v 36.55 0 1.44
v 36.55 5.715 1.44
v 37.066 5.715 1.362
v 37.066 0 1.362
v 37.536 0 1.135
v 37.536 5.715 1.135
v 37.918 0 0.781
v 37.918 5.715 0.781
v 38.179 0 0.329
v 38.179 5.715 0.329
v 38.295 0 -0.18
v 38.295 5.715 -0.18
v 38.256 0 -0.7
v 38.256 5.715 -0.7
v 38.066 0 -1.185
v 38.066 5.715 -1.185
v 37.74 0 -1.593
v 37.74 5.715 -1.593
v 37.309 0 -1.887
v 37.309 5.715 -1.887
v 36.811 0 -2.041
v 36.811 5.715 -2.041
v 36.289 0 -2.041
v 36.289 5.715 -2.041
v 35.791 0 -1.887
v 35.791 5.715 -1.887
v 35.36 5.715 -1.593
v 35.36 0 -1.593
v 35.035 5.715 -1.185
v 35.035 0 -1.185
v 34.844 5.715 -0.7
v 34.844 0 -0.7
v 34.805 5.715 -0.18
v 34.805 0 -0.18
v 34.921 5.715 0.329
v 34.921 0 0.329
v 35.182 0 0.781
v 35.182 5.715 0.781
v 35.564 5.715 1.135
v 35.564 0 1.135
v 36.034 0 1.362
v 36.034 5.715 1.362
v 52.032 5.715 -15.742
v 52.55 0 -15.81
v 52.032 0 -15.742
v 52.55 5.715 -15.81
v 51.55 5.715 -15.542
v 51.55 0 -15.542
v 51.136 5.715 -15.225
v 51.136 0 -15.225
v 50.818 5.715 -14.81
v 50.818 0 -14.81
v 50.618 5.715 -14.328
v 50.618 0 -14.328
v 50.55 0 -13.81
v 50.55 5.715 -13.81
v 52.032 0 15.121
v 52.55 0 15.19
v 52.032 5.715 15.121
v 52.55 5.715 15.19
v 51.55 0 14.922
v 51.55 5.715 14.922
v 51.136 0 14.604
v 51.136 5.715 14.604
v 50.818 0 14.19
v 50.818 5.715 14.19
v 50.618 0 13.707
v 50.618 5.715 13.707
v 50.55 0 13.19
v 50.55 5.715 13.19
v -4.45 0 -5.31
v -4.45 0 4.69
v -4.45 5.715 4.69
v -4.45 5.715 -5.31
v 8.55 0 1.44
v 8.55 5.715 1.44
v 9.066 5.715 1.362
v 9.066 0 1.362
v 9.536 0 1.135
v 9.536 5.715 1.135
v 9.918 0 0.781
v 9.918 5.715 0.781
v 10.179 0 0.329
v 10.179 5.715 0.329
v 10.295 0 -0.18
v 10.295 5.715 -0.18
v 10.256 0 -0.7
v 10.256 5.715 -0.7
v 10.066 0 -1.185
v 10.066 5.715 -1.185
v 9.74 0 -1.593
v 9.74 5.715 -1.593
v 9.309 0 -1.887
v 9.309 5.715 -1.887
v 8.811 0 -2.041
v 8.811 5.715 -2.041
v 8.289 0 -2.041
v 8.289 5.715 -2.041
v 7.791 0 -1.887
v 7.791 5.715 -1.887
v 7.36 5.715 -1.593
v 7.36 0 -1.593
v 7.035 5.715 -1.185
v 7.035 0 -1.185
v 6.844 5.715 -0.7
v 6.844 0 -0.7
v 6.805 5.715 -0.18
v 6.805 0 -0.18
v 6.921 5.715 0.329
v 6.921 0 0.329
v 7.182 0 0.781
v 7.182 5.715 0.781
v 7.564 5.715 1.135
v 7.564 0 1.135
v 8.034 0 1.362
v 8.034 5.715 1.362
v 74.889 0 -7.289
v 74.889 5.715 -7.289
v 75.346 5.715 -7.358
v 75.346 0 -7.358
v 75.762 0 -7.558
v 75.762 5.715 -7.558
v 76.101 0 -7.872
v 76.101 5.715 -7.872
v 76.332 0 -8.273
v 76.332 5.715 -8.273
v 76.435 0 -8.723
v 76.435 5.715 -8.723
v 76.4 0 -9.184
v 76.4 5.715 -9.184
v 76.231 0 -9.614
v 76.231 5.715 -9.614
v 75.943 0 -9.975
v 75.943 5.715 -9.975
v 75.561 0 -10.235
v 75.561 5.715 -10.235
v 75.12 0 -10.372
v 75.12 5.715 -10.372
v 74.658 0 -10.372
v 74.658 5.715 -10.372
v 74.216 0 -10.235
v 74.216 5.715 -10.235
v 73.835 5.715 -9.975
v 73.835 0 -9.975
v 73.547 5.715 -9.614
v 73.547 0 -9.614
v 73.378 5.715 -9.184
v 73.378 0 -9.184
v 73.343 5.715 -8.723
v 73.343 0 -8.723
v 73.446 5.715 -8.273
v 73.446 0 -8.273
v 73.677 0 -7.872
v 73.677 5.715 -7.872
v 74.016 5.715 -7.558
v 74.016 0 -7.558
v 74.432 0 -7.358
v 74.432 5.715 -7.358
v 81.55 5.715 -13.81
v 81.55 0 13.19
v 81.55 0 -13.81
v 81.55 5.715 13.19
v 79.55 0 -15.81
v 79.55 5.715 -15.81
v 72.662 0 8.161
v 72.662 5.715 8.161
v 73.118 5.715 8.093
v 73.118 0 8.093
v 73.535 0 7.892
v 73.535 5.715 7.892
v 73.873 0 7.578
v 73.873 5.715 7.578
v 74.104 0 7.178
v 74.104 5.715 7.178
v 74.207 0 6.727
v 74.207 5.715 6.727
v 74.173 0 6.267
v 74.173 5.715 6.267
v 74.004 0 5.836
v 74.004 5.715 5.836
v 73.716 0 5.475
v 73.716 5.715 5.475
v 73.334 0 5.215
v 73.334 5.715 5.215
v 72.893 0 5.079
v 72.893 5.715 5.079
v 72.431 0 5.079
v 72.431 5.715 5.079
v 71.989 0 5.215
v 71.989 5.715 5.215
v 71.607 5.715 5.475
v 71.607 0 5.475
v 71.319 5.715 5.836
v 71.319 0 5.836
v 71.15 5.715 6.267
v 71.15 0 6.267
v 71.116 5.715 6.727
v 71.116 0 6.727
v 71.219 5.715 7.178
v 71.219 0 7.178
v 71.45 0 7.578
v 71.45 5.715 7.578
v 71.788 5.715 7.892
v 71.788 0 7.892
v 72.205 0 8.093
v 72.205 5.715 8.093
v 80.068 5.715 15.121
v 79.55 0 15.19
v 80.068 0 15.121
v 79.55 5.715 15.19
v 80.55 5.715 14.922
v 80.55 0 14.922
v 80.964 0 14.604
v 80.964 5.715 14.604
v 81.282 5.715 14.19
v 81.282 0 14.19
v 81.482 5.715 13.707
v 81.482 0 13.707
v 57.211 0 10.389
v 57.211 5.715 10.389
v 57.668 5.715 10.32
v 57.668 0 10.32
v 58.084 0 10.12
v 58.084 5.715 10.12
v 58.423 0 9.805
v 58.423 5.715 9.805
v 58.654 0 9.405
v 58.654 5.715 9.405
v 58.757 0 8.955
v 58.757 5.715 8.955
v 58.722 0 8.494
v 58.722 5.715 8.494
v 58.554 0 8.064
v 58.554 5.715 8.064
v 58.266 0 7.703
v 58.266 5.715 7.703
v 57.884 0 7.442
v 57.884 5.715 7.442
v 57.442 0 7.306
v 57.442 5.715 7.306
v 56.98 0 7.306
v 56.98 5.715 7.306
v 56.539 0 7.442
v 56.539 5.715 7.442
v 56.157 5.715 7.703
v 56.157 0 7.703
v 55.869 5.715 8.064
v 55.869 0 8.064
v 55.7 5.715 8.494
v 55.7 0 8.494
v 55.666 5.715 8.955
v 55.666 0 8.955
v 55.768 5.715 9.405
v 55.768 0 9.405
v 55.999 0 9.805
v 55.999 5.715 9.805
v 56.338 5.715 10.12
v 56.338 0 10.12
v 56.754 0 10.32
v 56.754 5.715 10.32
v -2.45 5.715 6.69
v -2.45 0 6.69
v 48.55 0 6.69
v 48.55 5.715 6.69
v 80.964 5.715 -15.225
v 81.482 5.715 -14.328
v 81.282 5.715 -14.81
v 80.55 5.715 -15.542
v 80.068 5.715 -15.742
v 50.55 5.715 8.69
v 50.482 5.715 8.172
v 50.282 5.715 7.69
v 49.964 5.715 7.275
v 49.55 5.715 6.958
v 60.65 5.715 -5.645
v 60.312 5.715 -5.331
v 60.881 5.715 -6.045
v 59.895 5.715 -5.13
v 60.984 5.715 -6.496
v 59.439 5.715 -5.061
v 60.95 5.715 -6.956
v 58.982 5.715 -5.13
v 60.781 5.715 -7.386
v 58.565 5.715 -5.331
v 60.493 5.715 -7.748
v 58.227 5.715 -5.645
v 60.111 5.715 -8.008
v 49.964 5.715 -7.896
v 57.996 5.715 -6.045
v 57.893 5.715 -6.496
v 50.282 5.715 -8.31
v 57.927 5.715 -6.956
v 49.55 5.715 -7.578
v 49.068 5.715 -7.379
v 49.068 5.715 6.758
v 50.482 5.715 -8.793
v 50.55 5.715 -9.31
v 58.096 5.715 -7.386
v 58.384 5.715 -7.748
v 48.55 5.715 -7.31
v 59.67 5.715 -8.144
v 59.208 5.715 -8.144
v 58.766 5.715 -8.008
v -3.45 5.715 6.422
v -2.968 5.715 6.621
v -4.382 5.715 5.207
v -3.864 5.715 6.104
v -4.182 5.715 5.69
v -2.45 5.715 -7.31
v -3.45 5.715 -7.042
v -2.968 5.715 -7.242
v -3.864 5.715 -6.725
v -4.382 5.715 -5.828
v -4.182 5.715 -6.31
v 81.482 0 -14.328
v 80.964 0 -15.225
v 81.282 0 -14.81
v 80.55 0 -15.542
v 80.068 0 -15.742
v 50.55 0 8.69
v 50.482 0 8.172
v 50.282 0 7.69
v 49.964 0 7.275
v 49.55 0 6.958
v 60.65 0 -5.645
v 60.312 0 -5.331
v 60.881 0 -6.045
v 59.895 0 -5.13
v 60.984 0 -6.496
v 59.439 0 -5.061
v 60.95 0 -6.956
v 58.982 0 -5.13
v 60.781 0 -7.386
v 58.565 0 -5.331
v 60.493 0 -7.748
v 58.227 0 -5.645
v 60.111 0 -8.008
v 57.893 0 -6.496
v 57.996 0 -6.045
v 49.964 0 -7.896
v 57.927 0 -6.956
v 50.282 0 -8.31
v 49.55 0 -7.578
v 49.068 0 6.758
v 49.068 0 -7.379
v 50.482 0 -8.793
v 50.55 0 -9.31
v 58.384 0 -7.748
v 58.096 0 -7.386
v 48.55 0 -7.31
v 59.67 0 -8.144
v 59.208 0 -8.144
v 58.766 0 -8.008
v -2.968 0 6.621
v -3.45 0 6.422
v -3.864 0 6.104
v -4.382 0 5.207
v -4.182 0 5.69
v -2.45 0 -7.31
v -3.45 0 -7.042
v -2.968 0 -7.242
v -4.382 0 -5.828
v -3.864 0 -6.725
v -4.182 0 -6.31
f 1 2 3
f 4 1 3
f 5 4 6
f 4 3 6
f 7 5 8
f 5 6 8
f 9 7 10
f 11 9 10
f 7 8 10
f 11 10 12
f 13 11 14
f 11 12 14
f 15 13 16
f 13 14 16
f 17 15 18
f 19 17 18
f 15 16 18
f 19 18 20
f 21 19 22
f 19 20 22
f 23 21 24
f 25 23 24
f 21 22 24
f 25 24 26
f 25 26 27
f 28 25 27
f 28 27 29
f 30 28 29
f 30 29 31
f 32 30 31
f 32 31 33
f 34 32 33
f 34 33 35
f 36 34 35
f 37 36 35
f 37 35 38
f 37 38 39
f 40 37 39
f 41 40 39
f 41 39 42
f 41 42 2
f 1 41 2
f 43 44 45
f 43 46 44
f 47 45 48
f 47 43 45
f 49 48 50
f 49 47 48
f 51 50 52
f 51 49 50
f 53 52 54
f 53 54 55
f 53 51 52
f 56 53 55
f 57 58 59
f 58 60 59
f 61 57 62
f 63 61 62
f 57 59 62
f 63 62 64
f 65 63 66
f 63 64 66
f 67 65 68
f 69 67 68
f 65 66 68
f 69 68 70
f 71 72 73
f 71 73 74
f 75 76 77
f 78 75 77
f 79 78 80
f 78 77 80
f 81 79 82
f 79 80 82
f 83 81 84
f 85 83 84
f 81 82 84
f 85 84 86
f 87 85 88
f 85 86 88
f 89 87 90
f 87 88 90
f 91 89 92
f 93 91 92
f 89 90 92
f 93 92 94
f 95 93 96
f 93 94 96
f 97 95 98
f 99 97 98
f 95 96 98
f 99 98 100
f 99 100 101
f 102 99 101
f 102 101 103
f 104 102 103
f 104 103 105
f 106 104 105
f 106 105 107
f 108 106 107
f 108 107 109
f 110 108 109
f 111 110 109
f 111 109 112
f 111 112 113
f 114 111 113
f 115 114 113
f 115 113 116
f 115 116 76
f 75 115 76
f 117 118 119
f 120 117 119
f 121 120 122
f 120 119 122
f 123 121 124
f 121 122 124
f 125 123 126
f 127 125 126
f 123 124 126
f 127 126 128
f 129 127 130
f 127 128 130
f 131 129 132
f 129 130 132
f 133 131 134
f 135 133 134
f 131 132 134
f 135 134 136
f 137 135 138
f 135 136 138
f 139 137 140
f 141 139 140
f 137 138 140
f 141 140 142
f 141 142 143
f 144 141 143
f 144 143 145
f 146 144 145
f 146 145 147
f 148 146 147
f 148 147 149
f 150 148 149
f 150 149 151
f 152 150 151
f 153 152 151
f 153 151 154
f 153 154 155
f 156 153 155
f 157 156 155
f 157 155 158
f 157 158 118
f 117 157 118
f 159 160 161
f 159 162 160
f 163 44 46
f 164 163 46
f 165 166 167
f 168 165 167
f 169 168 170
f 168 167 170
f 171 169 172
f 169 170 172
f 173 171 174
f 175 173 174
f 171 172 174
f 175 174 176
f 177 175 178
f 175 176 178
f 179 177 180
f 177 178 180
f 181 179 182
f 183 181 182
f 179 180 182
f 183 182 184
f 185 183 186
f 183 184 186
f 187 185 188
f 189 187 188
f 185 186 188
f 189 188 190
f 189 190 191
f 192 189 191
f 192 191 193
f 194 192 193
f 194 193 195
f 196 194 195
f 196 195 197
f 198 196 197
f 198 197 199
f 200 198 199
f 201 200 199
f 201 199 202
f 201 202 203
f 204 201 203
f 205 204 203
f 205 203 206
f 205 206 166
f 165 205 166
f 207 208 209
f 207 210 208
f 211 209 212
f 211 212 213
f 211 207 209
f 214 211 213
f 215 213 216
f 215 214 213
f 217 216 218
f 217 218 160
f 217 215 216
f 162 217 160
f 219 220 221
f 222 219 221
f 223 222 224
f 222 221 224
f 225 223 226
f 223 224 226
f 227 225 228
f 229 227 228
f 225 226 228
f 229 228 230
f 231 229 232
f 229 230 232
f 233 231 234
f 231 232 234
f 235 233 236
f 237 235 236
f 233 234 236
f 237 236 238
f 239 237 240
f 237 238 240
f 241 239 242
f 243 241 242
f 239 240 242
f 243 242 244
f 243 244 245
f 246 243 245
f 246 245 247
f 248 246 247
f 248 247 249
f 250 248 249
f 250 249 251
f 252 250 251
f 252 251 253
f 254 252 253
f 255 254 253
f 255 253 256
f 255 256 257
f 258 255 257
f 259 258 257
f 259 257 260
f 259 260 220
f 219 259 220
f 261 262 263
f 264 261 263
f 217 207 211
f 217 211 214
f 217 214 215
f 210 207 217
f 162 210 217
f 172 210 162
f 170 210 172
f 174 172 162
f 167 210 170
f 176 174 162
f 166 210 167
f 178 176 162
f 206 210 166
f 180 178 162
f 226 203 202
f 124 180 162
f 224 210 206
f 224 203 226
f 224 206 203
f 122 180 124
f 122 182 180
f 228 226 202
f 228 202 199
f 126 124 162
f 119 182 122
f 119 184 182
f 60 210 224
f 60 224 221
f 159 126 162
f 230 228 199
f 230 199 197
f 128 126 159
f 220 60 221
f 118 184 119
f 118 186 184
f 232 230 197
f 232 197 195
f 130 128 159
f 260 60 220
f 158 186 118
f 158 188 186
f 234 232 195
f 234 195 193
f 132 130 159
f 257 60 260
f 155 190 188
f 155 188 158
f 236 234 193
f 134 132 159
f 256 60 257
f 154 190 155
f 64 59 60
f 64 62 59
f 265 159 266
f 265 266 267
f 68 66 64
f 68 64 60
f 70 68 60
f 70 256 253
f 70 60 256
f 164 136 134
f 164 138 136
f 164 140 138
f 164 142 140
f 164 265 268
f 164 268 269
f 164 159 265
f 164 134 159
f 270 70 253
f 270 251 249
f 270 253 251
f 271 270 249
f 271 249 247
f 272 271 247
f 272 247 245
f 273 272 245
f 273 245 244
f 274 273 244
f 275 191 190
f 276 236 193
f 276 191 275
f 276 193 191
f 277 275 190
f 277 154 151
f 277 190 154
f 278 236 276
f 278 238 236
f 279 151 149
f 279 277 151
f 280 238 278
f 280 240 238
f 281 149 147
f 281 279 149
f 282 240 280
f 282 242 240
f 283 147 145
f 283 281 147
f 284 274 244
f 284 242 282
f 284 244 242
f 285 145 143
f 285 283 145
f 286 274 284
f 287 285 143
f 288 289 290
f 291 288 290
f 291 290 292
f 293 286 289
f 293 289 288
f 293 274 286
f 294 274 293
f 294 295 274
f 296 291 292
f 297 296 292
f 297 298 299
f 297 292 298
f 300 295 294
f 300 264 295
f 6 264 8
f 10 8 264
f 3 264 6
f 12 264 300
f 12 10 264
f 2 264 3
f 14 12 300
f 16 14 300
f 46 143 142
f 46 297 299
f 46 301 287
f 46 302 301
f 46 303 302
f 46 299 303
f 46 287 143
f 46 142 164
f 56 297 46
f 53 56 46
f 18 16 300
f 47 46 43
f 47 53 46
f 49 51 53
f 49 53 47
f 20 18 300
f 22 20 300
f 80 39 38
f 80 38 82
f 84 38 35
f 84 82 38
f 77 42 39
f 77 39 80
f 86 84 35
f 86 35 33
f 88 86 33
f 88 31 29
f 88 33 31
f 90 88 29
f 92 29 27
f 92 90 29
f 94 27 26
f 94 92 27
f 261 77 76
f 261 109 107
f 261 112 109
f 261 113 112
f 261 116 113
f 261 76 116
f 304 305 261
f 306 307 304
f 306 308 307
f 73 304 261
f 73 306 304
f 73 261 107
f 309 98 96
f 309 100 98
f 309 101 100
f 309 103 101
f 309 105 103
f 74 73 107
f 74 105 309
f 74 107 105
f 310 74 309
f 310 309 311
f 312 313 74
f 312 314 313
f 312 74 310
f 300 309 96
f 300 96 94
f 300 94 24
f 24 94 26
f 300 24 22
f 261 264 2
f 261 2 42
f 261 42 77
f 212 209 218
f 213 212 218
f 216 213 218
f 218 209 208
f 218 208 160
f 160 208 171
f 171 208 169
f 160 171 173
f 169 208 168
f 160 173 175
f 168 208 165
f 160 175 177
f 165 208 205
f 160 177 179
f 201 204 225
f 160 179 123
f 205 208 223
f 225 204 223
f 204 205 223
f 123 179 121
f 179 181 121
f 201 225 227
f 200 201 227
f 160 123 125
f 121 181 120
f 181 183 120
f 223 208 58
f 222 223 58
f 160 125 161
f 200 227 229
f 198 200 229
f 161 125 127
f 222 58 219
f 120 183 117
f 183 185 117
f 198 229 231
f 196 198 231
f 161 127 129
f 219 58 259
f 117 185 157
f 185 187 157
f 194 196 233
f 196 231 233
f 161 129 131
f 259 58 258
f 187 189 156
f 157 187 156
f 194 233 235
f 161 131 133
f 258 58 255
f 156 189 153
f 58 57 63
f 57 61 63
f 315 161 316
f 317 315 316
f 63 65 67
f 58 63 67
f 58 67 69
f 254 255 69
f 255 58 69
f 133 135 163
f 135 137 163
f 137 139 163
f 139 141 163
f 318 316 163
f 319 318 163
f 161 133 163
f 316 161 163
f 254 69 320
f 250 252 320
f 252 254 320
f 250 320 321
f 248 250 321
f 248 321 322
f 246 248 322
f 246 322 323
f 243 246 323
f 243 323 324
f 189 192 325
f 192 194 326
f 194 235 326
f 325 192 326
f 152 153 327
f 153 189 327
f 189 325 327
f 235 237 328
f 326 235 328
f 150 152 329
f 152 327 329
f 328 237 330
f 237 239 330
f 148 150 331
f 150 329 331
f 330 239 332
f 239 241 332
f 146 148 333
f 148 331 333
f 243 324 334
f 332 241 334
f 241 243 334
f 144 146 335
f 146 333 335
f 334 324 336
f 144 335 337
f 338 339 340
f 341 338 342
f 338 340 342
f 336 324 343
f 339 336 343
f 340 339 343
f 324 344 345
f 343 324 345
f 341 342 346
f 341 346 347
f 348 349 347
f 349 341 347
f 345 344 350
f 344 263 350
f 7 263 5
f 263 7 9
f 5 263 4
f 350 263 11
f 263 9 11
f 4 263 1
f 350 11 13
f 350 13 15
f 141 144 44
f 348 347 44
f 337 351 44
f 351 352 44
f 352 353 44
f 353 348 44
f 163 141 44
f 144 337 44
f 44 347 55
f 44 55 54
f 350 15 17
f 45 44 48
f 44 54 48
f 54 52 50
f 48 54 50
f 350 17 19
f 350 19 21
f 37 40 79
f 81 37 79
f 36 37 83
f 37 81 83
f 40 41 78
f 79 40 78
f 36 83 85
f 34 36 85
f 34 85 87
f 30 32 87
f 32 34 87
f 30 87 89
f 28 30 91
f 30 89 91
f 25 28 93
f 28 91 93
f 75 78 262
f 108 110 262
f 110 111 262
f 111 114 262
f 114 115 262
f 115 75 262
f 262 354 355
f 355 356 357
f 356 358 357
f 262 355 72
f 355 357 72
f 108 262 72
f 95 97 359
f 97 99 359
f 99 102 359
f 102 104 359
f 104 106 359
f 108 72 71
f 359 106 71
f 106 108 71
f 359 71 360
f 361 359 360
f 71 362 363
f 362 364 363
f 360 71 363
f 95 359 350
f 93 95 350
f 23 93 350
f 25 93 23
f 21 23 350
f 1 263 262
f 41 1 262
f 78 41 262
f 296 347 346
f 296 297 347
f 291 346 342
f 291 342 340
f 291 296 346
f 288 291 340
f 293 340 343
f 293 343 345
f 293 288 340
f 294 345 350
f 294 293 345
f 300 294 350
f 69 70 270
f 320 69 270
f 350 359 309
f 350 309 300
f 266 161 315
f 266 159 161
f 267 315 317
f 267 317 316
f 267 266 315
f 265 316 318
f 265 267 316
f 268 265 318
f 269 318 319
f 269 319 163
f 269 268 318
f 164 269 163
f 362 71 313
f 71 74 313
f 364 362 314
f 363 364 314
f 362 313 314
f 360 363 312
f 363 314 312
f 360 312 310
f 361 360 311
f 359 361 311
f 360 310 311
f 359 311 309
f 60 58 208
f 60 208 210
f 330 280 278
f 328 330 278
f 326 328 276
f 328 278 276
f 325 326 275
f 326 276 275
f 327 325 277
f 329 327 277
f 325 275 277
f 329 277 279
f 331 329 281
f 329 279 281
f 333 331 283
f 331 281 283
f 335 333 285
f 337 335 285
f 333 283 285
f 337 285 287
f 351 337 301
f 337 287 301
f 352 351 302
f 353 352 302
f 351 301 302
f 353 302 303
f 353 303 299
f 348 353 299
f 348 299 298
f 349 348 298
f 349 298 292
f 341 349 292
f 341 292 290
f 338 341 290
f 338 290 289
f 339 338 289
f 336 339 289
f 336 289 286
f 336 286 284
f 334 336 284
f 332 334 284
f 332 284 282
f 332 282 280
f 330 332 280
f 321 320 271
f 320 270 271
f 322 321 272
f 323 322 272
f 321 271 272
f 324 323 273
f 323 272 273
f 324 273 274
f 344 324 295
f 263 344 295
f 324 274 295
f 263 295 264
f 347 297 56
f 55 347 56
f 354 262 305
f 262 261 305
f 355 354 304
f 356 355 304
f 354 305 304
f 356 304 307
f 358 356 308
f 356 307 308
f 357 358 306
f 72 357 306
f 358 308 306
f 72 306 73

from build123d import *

# Parameters (mm, degrees)
SKETCH1_W           = 55
SKETCH1_H           = 14
BOSS_EXTRUDE1_DEPTH = 5.715
SKETCH2_R           = 1.75
CUT_EXTRUDE1_DEPTH  = 52.394687241
SKETCH3_W           = 31
SKETCH3_H           = 5.715
BOSS_EXTRUDE2_DEPTH = 31
SKETCH4_R           = 1.55
CUT_EXTRUDE2_DEPTH  = 84.264914302
FILLET1_R           = 2


with BuildPart() as part:
    # Sketch1 → Boss-Extrude1 (new body)
    with BuildSketch(Plane(origin=(0, 0, 0), x_dir=(1, 0, 0), z_dir=(0, 1, 0))):
        with Locations((23.05007671, 0.310430648)):
            Rectangle(SKETCH1_W, SKETCH1_H)
    extrude(amount=BOSS_EXTRUDE1_DEPTH)

    # Sketch2 → Cut-Extrude1 (cut, through all)
    with BuildSketch(Plane(origin=(0, 5.715, 0), x_dir=(1, 0, 0), z_dir=(0, 1, 0))):
        with Locations(Location((8.55007671, 0.310430648, 0), (0, 0, 270))):
            Circle(SKETCH2_R)
        with Locations(Location((36.55007671, 0.310430648, 0), (0, 0, 270))):
            Circle(SKETCH2_R)
    extrude(amount=-CUT_EXTRUDE1_DEPTH, mode=Mode.SUBTRACT)

    # Sketch3 → Boss-Extrude2 (add)
    with BuildSketch(Plane(origin=(50.55007671, 0, 0), x_dir=(0, 0, -1), z_dir=(1, 0, 0))):
        with Locations((0.310430648, 2.8575)):
            Rectangle(SKETCH3_W, SKETCH3_H)
    extrude(amount=BOSS_EXTRUDE2_DEPTH)

    # Sketch4 → Cut-Extrude2 (cut, through all)
    with BuildSketch(Plane(origin=(0, 5.715, 0), x_dir=(1, 0, 0), z_dir=(0, 1, 0))):
        with Locations(Location((57.211241945, -8.838834765, 0), (0, 0, 270))):
            Circle(SKETCH4_R)
        with Locations(Location((59.438628306, 6.611448404, 0), (0, 0, 270))):
            Circle(SKETCH4_R)
        with Locations(Location((74.888911475, 8.838834765, 0), (0, 0, 270))):
            Circle(SKETCH4_R)
        with Locations(Location((72.661525114, -6.611448404, 0), (0, 0, 270))):
            Circle(SKETCH4_R)
    extrude(amount=-CUT_EXTRUDE2_DEPTH, mode=Mode.SUBTRACT)

    # Fillet1
    fillet1_edges = [part.edges().sort_by_distance(p)[0] for p in [
        (-4.44992329, 2.8575, -7.310430648),
        (-4.44992329, 2.8575, 6.689569352),
        (50.55007671, 2.8575, -7.310430648),
        (50.55007671, 2.8575, 6.689569352),
        (50.55007671, 2.8575, -15.810430648),
        (81.55007671, 2.8575, -15.810430648),
        (81.55007671, 2.8575, 15.189569352),
        (50.55007671, 2.8575, 15.189569352),
    ]]
    fillet(fillet1_edges, radius=FILLET1_R)


solid = part.part
